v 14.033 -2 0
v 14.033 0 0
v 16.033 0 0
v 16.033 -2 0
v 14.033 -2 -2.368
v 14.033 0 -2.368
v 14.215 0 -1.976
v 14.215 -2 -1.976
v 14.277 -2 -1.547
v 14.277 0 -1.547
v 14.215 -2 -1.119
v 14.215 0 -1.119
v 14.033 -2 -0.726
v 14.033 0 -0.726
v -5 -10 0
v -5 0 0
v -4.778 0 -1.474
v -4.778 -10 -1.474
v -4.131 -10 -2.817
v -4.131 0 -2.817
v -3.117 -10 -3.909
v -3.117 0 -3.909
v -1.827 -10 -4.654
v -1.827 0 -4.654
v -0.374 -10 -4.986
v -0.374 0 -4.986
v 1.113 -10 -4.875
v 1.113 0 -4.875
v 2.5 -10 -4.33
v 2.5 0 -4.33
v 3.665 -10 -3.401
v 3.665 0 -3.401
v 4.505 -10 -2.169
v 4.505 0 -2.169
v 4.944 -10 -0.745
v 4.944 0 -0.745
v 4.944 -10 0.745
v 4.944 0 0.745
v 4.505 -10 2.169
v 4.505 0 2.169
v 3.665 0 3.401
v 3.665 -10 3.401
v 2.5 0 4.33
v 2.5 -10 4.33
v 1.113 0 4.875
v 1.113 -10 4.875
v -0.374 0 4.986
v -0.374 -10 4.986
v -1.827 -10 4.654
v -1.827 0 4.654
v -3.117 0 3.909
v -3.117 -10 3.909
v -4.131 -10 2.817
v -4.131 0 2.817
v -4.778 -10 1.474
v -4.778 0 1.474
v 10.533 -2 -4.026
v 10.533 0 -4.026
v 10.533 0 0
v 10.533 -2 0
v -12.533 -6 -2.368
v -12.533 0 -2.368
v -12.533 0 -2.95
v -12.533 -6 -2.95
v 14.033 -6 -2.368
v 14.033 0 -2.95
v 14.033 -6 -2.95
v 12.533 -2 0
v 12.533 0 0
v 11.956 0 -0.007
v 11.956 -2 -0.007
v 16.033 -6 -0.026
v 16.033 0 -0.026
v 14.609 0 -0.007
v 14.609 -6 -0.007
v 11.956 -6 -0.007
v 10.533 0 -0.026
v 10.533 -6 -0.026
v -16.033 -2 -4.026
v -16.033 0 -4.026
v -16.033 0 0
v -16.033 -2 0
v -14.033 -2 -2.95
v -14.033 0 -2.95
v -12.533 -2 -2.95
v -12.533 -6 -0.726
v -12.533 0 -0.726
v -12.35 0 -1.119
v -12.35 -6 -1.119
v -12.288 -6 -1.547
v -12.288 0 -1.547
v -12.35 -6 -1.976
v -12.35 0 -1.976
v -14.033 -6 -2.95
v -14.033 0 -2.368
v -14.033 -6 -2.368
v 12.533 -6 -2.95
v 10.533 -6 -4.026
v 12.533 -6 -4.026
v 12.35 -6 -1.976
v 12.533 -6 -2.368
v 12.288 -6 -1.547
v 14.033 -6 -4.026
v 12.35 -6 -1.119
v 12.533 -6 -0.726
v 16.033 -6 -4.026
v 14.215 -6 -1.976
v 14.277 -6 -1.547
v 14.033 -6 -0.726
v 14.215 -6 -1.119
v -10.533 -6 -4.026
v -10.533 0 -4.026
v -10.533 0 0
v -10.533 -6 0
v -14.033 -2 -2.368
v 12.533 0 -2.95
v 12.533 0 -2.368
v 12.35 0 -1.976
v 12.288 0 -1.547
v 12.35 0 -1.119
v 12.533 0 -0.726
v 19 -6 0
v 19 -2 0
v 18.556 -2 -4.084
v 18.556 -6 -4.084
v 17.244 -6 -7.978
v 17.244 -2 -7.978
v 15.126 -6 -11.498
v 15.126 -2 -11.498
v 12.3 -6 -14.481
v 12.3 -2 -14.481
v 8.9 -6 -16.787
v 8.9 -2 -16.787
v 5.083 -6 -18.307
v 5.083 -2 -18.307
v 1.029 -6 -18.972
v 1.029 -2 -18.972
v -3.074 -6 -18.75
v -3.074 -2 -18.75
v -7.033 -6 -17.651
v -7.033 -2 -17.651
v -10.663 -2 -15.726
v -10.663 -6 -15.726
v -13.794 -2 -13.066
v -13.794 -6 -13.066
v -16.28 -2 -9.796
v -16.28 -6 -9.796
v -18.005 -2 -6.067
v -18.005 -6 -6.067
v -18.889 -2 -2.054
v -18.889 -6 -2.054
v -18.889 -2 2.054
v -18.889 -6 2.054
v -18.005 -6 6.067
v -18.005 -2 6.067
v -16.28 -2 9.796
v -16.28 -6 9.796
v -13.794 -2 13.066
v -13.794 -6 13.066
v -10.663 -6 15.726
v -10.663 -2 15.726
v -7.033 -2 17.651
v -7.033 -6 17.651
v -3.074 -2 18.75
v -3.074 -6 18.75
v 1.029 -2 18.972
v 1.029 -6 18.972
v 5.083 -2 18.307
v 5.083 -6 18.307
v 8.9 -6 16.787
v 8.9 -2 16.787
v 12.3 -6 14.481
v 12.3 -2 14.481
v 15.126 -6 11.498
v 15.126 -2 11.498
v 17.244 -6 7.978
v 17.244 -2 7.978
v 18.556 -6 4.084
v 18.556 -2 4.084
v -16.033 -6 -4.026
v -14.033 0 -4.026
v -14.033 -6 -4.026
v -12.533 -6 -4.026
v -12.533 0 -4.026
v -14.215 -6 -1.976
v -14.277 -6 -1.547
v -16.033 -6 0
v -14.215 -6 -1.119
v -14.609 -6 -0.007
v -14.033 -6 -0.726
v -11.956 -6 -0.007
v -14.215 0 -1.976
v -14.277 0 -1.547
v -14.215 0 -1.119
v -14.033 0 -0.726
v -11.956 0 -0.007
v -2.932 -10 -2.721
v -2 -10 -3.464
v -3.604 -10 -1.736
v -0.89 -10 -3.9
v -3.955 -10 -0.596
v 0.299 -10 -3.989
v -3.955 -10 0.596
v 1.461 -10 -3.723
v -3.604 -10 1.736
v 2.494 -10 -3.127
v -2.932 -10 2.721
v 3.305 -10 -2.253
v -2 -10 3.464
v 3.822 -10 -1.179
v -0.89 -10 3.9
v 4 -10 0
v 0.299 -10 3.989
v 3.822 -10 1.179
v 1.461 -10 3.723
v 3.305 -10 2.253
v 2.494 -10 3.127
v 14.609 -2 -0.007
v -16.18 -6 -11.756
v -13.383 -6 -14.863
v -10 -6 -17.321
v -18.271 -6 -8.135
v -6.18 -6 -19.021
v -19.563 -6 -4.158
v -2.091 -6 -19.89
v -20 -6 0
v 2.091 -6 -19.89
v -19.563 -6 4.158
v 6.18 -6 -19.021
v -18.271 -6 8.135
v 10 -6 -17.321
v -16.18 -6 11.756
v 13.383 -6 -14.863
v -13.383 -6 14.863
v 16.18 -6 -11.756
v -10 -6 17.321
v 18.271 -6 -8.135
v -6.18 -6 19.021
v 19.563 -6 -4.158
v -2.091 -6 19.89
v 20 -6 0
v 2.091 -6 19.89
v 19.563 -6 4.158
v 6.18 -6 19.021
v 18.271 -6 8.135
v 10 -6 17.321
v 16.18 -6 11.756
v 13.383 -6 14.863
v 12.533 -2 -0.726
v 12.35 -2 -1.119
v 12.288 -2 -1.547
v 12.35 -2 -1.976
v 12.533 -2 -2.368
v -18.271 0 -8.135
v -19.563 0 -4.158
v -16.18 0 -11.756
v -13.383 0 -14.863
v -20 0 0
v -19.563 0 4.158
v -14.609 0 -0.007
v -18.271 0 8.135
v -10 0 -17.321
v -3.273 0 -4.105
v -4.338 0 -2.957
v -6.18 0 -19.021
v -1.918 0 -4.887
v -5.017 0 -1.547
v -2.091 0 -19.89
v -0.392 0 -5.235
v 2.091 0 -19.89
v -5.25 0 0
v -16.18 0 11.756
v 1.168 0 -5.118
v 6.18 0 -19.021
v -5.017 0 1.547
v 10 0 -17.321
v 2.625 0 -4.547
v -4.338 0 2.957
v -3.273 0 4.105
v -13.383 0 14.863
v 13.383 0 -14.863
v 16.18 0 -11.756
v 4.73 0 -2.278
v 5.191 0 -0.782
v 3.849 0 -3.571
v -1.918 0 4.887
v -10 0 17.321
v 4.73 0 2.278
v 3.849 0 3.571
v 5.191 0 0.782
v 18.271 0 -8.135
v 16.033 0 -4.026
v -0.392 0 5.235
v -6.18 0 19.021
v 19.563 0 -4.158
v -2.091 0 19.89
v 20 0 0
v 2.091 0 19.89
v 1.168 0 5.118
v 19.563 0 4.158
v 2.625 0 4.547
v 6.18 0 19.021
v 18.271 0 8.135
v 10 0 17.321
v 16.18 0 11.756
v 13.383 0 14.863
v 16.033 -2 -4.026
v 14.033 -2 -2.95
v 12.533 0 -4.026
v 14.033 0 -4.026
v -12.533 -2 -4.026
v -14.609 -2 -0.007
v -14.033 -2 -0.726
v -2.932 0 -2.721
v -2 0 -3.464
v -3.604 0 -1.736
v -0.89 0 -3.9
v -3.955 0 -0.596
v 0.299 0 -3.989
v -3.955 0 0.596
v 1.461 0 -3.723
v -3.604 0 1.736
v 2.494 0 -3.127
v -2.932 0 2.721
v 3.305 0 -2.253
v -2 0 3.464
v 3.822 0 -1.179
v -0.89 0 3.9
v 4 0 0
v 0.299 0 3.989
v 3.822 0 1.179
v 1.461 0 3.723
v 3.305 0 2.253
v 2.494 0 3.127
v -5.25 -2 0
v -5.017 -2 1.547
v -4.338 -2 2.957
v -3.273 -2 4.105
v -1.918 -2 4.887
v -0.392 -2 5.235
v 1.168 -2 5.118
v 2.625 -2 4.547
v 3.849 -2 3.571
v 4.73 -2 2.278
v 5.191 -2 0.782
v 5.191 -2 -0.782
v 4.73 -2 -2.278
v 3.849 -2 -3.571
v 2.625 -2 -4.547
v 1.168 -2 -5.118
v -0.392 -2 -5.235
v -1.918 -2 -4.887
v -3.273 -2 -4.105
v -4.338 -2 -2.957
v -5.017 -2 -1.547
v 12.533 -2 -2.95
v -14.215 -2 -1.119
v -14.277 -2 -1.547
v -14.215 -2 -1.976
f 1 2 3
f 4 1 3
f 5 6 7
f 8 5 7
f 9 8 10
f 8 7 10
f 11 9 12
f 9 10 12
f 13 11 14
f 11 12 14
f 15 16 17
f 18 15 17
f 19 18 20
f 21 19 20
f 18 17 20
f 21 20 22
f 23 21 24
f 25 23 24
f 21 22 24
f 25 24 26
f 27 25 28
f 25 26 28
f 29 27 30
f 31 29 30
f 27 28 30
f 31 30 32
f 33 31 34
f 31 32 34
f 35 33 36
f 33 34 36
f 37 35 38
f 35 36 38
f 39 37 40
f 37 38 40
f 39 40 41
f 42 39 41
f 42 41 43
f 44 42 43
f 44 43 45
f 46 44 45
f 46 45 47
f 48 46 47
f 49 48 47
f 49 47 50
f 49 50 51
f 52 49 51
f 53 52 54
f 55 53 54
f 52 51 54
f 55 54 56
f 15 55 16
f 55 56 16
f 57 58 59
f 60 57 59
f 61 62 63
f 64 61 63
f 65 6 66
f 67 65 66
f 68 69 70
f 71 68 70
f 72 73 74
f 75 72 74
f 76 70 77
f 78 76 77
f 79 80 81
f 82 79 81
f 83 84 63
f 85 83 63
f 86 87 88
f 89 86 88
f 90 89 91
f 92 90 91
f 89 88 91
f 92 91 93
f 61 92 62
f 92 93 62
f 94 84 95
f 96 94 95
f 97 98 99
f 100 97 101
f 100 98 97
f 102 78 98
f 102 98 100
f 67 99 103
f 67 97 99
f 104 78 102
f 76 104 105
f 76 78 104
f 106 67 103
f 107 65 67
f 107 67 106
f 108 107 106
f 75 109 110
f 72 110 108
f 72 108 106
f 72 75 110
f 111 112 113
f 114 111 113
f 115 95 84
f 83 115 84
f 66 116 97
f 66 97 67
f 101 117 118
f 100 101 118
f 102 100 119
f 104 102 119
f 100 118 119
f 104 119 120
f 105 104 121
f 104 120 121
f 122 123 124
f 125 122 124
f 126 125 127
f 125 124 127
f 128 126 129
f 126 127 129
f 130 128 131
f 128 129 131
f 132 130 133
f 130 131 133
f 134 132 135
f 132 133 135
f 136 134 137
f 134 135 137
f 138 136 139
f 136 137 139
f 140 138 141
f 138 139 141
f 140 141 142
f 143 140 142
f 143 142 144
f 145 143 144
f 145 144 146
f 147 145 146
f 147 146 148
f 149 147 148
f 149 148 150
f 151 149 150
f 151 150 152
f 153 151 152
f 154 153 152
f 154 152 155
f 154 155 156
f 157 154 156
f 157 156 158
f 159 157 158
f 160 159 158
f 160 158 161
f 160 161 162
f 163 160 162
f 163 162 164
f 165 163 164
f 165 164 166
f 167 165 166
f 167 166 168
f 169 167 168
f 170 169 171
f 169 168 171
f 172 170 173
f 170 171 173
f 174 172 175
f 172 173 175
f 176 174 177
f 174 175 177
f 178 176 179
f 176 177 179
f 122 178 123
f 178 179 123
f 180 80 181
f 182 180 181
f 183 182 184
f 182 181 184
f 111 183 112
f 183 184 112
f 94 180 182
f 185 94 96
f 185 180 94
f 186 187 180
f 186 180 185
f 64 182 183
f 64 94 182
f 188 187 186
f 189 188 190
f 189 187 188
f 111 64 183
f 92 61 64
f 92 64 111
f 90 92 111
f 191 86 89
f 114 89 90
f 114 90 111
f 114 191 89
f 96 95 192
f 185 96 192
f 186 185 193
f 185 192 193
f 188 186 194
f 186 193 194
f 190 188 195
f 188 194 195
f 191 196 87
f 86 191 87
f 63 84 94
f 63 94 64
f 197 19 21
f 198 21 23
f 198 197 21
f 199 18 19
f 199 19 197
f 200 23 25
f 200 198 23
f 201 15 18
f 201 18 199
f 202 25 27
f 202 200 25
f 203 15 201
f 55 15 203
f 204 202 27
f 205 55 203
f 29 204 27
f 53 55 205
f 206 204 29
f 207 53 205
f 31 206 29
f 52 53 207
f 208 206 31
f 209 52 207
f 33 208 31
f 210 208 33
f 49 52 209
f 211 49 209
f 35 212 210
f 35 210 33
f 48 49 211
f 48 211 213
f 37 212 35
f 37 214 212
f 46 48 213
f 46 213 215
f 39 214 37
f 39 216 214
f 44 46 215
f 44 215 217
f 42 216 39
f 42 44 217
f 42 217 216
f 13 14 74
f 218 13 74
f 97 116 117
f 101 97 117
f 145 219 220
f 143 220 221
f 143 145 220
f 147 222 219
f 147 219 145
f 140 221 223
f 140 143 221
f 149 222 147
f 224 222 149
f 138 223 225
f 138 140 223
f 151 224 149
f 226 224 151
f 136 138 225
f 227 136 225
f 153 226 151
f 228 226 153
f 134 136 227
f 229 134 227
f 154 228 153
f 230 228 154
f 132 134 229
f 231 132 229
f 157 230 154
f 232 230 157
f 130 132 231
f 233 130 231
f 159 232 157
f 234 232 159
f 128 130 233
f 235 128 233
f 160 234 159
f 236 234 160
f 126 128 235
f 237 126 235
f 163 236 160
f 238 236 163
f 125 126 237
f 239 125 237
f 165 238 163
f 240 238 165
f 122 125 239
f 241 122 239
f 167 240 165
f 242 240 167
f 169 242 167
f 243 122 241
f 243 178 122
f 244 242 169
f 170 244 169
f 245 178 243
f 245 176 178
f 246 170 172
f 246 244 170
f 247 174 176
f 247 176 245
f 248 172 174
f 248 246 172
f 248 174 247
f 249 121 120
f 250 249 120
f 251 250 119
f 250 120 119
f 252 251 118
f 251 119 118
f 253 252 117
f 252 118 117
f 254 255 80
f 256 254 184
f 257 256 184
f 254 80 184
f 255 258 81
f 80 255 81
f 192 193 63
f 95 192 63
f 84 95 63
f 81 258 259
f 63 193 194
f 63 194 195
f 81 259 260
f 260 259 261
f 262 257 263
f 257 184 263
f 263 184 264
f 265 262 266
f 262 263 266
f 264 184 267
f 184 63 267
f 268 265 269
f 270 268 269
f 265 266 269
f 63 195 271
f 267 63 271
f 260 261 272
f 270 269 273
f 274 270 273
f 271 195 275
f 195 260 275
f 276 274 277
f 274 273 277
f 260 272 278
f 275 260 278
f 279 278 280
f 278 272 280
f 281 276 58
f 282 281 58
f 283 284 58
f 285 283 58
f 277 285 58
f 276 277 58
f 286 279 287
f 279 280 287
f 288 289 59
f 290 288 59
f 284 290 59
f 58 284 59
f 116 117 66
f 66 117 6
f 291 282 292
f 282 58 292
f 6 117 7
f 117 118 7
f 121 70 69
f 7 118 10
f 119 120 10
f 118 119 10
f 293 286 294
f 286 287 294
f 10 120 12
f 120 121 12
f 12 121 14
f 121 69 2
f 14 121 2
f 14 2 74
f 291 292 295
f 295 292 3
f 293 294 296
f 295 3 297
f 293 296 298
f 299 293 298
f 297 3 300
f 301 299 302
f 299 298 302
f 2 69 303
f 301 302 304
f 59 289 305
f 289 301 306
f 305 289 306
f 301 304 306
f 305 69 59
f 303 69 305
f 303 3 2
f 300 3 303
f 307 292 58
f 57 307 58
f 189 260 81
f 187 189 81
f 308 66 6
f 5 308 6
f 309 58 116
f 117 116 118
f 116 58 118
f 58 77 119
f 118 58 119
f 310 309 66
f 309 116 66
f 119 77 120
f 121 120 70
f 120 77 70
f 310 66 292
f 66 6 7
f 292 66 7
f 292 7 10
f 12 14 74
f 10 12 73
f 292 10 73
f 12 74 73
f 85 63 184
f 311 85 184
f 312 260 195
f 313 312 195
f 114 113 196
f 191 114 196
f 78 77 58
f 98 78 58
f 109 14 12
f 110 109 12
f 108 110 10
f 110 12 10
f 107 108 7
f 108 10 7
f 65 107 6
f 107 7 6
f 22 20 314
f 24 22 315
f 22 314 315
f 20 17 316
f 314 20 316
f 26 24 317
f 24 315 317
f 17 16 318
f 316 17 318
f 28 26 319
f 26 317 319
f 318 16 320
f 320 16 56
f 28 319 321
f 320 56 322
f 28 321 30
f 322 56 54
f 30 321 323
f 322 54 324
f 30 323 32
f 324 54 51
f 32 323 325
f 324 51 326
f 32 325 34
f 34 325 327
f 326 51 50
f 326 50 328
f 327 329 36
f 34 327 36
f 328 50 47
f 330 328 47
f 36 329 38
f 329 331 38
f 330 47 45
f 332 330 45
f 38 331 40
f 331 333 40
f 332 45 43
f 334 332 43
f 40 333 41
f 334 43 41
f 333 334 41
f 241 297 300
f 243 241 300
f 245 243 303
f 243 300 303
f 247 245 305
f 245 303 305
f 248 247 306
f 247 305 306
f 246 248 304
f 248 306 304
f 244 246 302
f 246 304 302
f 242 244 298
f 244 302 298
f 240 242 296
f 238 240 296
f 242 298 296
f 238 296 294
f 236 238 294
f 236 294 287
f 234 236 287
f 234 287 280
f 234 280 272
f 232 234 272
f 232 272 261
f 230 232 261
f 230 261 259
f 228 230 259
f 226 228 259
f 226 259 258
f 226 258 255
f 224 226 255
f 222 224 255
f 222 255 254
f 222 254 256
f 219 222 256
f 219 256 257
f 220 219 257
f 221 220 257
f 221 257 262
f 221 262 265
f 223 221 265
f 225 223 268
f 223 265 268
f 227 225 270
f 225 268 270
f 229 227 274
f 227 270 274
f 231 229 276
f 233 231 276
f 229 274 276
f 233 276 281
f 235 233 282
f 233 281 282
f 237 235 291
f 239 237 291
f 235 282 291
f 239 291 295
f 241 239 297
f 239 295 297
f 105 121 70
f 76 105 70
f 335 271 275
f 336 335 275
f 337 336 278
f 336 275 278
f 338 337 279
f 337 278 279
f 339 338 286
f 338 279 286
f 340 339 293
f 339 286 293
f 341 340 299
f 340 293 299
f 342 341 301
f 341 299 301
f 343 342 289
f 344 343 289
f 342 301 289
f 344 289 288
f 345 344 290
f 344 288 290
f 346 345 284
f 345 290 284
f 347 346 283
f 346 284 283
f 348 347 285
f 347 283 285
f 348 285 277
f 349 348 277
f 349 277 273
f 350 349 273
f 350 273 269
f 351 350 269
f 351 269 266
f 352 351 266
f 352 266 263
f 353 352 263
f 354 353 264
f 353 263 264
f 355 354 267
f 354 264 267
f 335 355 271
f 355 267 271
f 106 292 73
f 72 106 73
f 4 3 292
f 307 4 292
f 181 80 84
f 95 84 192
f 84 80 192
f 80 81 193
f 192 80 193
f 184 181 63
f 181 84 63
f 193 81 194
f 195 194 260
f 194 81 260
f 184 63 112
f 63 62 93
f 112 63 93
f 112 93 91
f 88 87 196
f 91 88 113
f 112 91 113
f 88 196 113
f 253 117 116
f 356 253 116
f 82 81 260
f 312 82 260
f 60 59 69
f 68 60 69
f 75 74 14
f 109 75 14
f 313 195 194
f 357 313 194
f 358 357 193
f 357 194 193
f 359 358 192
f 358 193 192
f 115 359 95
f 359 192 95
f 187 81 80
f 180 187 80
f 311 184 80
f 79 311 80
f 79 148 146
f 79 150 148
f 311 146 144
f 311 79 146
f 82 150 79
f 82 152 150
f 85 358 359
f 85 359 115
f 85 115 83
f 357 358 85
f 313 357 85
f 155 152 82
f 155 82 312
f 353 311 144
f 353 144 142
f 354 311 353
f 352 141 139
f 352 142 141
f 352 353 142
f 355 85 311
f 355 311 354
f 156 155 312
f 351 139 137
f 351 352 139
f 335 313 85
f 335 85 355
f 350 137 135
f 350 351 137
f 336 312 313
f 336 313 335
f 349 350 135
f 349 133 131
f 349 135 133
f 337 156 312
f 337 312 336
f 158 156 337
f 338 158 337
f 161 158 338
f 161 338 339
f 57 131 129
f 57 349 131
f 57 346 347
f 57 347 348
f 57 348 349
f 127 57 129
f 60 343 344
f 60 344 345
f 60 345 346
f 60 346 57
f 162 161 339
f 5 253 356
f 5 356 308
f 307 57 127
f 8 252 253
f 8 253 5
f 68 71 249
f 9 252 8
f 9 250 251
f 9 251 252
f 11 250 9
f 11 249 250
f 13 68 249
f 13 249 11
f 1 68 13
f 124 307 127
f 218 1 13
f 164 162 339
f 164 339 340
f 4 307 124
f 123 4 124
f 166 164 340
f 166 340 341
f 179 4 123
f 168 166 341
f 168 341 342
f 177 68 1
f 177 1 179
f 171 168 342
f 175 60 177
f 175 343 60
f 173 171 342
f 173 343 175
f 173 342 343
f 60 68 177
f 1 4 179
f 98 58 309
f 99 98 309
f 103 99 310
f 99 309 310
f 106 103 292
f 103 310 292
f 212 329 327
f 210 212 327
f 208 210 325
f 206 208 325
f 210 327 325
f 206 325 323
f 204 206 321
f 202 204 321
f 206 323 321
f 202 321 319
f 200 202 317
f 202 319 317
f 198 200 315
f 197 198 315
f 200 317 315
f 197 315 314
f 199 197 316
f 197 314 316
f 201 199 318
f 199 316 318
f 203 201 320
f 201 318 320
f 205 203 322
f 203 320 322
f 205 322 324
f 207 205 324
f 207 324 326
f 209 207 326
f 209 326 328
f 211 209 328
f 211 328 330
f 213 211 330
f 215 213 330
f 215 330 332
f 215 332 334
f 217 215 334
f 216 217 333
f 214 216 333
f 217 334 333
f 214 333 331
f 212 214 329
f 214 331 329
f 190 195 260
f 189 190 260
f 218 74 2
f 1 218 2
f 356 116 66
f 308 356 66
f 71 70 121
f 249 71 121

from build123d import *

# Parameters (mm, degrees)
F0_R     = 20
F1_DEPTH = 6
F0_W     = 1.5
F0_H     = 1.0754615068
F2_DEPTH = 2
F3_DEPTH = 10


# Not quite as in the source:
# - a feature names something its author has since deleted; it is built from what else it names


with BuildPart() as f1:
    # F0 (on Front) → F1 (new body)
    with BuildSketch(Plane.XZ):
        Circle(F0_R)
        with BuildLine():
            ThreePointArc((-19, 0), (0, 19), (19, 0))
            ThreePointArc((19, 0), (0, -19), (-19, 0))
        make_face(mode=Mode.SUBTRACT)
    extrude(amount=F1_DEPTH)

    # F0 (on Front) → F2 (join)
    with BuildSketch(Plane.XZ):
        Circle(F0_R)
        with BuildLine():
            ThreePointArc((-19, 0), (0, 19), (19, 0))
            ThreePointArc((19, 0), (0, -19), (-19, 0))
        make_face(mode=Mode.SUBTRACT)
        with BuildLine():
            Line((16.0325318575, 0), (19, 0))
            ThreePointArc((19, 0), (0, 19), (-19, 0))
            Line((-19, 0), (-16.0325318575, 0))
            Line((-16.0325318575, 0), (-14.0325318575, 0))
            Line((-14.0325318575, 0), (-12.5325318575, 0))
            Line((-12.5325318575, 0), (-10.5325318575, 0))
            Line((-10.5325318575, 0), (-7.5, 0))
            ThreePointArc((-7.5, 0), (0, 7.5), (7.5, 0))
            Line((7.5, 0), (10.5325318575, 0))
            Line((10.5325318575, 0), (12.5325318575, 0))
            Line((12.5325318575, 0), (14.0325318575, 0))
            Line((14.0325318575, 0), (16.0325318575, 0))
        make_face()
        with BuildLine():
            ThreePointArc((-19, 0), (0, -19), (19, 0))
            Line((19, 0), (16.0325318575, 0))
            Line((16.0325318575, 0), (16.0325318575, -0.0255133063))
            Line((16.0325318575, -0.0255133063), (16.0325318575, -4.0255133063))
            Line((16.0325318575, -4.0255133063), (14.0325318575, -4.0255133063))
            Line((14.0325318575, -4.0255133063), (12.5325318575, -4.0255133063))
            Line((12.5325318575, -4.0255133063), (10.5325318575, -4.0255133063))
            Line((10.5325318575, -4.0255133063), (10.5325318575, -0.0255133063))
            Line((10.5325318575, -0.0255133063), (10.5325318575, 0))
            Line((10.5325318575, 0), (7.5, 0))
            ThreePointArc((7.5, 0), (0, -7.5), (-7.5, 0))
            Line((-7.5, 0), (-10.5325318575, 0))
            Line((-10.5325318575, 0), (-10.5325318575, -4.0255133063))
            Line((-10.5325318575, -4.0255133063), (-12.5325318575, -4.0255133063))
            Line((-12.5325318575, -4.0255133063), (-14.0325318575, -4.0255133063))
            Line((-14.0325318575, -4.0255133063), (-16.0325318575, -4.0255133063))
            Line((-16.0325318575, -4.0255133063), (-16.0325318575, 0))
            Line((-16.0325318575, 0), (-19, 0))
        make_face()
        with BuildLine():
            Line((-10.5325318575, -4.0255133063), (-10.5325318575, 0))
            Line((-10.5325318575, 0), (-11.9558069244, -0.0073570799))
            Line((-11.9558069244, -0.0073570799), (-12.5325318575, -0.7263235748))
            ThreePointArc((-12.5325318575, -0.7263235748), (-12.2877066772, -1.5473542735), (-12.5325318575, -2.3683849722))
            Line((-12.5325318575, -2.3683849722), (-12.5325318575, -2.9500517994))
            Line((-12.5325318575, -2.9500517994), (-12.5325318575, -4.0255133063))
            Line((-12.5325318575, -4.0255133063), (-10.5325318575, -4.0255133063))
        make_face()
        with BuildLine():
            ThreePointArc((-7.5, 0), (0, -7.5), (7.5, 0))
            Line((7.5, 0), (5.25, 0))
            ThreePointArc((5.25, 0), (0, -5.25), (-5.25, 0))
            Line((-5.25, 0), (-7.5, 0))
        make_face()
        with BuildLine():
            Line((5.25, 0), (7.5, 0))
            ThreePointArc((7.5, 0), (0, 7.5), (-7.5, 0))
            Line((-7.5, 0), (-5.25, 0))
            ThreePointArc((-5.25, 0), (0, 5.25), (5.25, 0))
        make_face()
        with BuildLine():
            Line((-14.0325318575, 0), (-16.0325318575, 0))
            Line((-16.0325318575, 0), (-14.6092567906, -0.0073570799))
            Line((-14.6092567906, -0.0073570799), (-14.0325318575, -0.7263235748))
            ThreePointArc((-14.0325318575, -0.7263235748), (-14.2773570377, -1.5473542735), (-14.0325318575, -2.3683849722))
            Line((-14.0325318575, -2.3683849722), (-14.0325318575, -2.9500517994))
            Line((-14.0325318575, -2.9500517994), (-12.5325318575, -2.9500517994))
            Line((-12.5325318575, -2.9500517994), (-12.5325318575, -2.3683849722))
            ThreePointArc((-12.5325318575, -2.3683849722), (-12.2877066772, -1.5473542735), (-12.5325318575, -0.7263235748))
            Line((-12.5325318575, -0.7263235748), (-11.9558069244, -0.0073570799))
            Line((-11.9558069244, -0.0073570799), (-10.5325318575, 0))
            Line((-10.5325318575, 0), (-12.5325318575, 0))
            Line((-12.5325318575, 0), (-14.0325318575, 0))
        make_face()
        with BuildLine():
            Line((14.6092567906, -0.0073570799), (14.0325318575, 0))
            Line((14.0325318575, 0), (12.5325318575, 0))
            Line((12.5325318575, 0), (11.9558069244, -0.0073570799))
            Line((11.9558069244, -0.0073570799), (12.5325318575, -0.7263235748))
            ThreePointArc((12.5325318575, -0.7263235748), (12.2877066772, -1.5473542735), (12.5325318575, -2.3683849722))
            Line((12.5325318575, -2.3683849722), (12.5325318575, -2.9500517994))
            Line((12.5325318575, -2.9500517994), (14.0325318575, -2.9500517994))
            Line((14.0325318575, -2.9500517994), (14.0325318575, -2.3683849722))
            ThreePointArc((14.0325318575, -2.3683849722), (14.2773570377, -1.5473542735), (14.0325318575, -0.7263235748))
            Line((14.0325318575, -0.7263235748), (14.6092567906, -0.0073570799))
        make_face()
    extrude(amount=F2_DEPTH)


with BuildPart() as f1b:
    # F0 (on Front) → F1, piece 2 (new body)
    with BuildSketch(Plane.XZ):
        with BuildLine():
            Line((-10.5325318575, -4.0255133063), (-10.5325318575, 0))
            Line((-10.5325318575, 0), (-11.9558069244, -0.0073570799))
            Line((-11.9558069244, -0.0073570799), (-12.5325318575, -0.7263235748))
            ThreePointArc((-12.5325318575, -0.7263235748), (-12.2877066772, -1.5473542735), (-12.5325318575, -2.3683849722))
            Line((-12.5325318575, -2.3683849722), (-12.5325318575, -2.9500517994))
            Line((-12.5325318575, -2.9500517994), (-12.5325318575, -4.0255133063))
            Line((-12.5325318575, -4.0255133063), (-10.5325318575, -4.0255133063))
        make_face()
        with Locations((-13.2825318575, -3.4877825528)):
            Rectangle(F0_W, F0_H)
        with BuildLine():
            Line((-14.6092567906, -0.0073570799), (-16.0325318575, 0))
            Line((-16.0325318575, 0), (-16.0325318575, -4.0255133063))
            Line((-16.0325318575, -4.0255133063), (-14.0325318575, -4.0255133063))
            Line((-14.0325318575, -4.0255133063), (-14.0325318575, -2.9500517994))
            Line((-14.0325318575, -2.9500517994), (-14.0325318575, -2.3683849722))
            ThreePointArc((-14.0325318575, -2.3683849722), (-14.2773570377, -1.5473542735), (-14.0325318575, -0.7263235748))
            Line((-14.0325318575, -0.7263235748), (-14.6092567906, -0.0073570799))
        make_face()
    extrude(amount=F1_DEPTH)


with BuildPart() as f1c:
    # F0 (on Front) → F1, piece 3 (new body)
    with BuildSketch(Plane.XZ):
        with BuildLine():
            Line((16.0325318575, -4.0255133063), (16.0325318575, -0.0255133063))
            Line((16.0325318575, -0.0255133063), (14.6092567906, -0.0073570799))
            Line((14.6092567906, -0.0073570799), (14.0325318575, -0.7263235748))
            ThreePointArc((14.0325318575, -0.7263235748), (14.2773570377, -1.5473542735), (14.0325318575, -2.3683849722))
            Line((14.0325318575, -2.3683849722), (14.0325318575, -2.9500517994))
            Line((14.0325318575, -2.9500517994), (14.0325318575, -4.0255133063))
            Line((14.0325318575, -4.0255133063), (16.0325318575, -4.0255133063))
        make_face()
        with BuildLine():
            Line((12.5325318575, -0.7263235748), (11.9558069244, -0.0073570799))
            Line((11.9558069244, -0.0073570799), (10.5325318575, -0.0255133063))
            Line((10.5325318575, -0.0255133063), (10.5325318575, -4.0255133063))
            Line((10.5325318575, -4.0255133063), (12.5325318575, -4.0255133063))
            Line((12.5325318575, -4.0255133063), (12.5325318575, -2.9500517994))
            Line((12.5325318575, -2.9500517994), (12.5325318575, -2.3683849722))
            ThreePointArc((12.5325318575, -2.3683849722), (12.2877066772, -1.5473542735), (12.5325318575, -0.7263235748))
        make_face()
        with Locations((13.2825318575, -3.4877825528)):
            Rectangle(F0_W, F0_H)
    extrude(amount=F1_DEPTH)


with BuildPart() as f3:
    # F0 (on Front) → F3 (new body)
    with BuildSketch(Plane.XZ):
        with BuildLine():
            Line((4, 0), (5, 0))
            ThreePointArc((5, 0), (0, 5), (-5, 0))
            Line((-5, 0), (-4, 0))
            ThreePointArc((-4, 0), (0, 4), (4, 0))
        make_face()
        with BuildLine():
            ThreePointArc((-5, 0), (0, -5), (5, 0))
            Line((5, 0), (4, 0))
            ThreePointArc((4, 0), (0, -4), (-4, 0))
            Line((-4, 0), (-5, 0))
        make_face()
    extrude(amount=F3_DEPTH)


solid = Compound([f1.part, f1b.part, f1c.part, f3.part])
